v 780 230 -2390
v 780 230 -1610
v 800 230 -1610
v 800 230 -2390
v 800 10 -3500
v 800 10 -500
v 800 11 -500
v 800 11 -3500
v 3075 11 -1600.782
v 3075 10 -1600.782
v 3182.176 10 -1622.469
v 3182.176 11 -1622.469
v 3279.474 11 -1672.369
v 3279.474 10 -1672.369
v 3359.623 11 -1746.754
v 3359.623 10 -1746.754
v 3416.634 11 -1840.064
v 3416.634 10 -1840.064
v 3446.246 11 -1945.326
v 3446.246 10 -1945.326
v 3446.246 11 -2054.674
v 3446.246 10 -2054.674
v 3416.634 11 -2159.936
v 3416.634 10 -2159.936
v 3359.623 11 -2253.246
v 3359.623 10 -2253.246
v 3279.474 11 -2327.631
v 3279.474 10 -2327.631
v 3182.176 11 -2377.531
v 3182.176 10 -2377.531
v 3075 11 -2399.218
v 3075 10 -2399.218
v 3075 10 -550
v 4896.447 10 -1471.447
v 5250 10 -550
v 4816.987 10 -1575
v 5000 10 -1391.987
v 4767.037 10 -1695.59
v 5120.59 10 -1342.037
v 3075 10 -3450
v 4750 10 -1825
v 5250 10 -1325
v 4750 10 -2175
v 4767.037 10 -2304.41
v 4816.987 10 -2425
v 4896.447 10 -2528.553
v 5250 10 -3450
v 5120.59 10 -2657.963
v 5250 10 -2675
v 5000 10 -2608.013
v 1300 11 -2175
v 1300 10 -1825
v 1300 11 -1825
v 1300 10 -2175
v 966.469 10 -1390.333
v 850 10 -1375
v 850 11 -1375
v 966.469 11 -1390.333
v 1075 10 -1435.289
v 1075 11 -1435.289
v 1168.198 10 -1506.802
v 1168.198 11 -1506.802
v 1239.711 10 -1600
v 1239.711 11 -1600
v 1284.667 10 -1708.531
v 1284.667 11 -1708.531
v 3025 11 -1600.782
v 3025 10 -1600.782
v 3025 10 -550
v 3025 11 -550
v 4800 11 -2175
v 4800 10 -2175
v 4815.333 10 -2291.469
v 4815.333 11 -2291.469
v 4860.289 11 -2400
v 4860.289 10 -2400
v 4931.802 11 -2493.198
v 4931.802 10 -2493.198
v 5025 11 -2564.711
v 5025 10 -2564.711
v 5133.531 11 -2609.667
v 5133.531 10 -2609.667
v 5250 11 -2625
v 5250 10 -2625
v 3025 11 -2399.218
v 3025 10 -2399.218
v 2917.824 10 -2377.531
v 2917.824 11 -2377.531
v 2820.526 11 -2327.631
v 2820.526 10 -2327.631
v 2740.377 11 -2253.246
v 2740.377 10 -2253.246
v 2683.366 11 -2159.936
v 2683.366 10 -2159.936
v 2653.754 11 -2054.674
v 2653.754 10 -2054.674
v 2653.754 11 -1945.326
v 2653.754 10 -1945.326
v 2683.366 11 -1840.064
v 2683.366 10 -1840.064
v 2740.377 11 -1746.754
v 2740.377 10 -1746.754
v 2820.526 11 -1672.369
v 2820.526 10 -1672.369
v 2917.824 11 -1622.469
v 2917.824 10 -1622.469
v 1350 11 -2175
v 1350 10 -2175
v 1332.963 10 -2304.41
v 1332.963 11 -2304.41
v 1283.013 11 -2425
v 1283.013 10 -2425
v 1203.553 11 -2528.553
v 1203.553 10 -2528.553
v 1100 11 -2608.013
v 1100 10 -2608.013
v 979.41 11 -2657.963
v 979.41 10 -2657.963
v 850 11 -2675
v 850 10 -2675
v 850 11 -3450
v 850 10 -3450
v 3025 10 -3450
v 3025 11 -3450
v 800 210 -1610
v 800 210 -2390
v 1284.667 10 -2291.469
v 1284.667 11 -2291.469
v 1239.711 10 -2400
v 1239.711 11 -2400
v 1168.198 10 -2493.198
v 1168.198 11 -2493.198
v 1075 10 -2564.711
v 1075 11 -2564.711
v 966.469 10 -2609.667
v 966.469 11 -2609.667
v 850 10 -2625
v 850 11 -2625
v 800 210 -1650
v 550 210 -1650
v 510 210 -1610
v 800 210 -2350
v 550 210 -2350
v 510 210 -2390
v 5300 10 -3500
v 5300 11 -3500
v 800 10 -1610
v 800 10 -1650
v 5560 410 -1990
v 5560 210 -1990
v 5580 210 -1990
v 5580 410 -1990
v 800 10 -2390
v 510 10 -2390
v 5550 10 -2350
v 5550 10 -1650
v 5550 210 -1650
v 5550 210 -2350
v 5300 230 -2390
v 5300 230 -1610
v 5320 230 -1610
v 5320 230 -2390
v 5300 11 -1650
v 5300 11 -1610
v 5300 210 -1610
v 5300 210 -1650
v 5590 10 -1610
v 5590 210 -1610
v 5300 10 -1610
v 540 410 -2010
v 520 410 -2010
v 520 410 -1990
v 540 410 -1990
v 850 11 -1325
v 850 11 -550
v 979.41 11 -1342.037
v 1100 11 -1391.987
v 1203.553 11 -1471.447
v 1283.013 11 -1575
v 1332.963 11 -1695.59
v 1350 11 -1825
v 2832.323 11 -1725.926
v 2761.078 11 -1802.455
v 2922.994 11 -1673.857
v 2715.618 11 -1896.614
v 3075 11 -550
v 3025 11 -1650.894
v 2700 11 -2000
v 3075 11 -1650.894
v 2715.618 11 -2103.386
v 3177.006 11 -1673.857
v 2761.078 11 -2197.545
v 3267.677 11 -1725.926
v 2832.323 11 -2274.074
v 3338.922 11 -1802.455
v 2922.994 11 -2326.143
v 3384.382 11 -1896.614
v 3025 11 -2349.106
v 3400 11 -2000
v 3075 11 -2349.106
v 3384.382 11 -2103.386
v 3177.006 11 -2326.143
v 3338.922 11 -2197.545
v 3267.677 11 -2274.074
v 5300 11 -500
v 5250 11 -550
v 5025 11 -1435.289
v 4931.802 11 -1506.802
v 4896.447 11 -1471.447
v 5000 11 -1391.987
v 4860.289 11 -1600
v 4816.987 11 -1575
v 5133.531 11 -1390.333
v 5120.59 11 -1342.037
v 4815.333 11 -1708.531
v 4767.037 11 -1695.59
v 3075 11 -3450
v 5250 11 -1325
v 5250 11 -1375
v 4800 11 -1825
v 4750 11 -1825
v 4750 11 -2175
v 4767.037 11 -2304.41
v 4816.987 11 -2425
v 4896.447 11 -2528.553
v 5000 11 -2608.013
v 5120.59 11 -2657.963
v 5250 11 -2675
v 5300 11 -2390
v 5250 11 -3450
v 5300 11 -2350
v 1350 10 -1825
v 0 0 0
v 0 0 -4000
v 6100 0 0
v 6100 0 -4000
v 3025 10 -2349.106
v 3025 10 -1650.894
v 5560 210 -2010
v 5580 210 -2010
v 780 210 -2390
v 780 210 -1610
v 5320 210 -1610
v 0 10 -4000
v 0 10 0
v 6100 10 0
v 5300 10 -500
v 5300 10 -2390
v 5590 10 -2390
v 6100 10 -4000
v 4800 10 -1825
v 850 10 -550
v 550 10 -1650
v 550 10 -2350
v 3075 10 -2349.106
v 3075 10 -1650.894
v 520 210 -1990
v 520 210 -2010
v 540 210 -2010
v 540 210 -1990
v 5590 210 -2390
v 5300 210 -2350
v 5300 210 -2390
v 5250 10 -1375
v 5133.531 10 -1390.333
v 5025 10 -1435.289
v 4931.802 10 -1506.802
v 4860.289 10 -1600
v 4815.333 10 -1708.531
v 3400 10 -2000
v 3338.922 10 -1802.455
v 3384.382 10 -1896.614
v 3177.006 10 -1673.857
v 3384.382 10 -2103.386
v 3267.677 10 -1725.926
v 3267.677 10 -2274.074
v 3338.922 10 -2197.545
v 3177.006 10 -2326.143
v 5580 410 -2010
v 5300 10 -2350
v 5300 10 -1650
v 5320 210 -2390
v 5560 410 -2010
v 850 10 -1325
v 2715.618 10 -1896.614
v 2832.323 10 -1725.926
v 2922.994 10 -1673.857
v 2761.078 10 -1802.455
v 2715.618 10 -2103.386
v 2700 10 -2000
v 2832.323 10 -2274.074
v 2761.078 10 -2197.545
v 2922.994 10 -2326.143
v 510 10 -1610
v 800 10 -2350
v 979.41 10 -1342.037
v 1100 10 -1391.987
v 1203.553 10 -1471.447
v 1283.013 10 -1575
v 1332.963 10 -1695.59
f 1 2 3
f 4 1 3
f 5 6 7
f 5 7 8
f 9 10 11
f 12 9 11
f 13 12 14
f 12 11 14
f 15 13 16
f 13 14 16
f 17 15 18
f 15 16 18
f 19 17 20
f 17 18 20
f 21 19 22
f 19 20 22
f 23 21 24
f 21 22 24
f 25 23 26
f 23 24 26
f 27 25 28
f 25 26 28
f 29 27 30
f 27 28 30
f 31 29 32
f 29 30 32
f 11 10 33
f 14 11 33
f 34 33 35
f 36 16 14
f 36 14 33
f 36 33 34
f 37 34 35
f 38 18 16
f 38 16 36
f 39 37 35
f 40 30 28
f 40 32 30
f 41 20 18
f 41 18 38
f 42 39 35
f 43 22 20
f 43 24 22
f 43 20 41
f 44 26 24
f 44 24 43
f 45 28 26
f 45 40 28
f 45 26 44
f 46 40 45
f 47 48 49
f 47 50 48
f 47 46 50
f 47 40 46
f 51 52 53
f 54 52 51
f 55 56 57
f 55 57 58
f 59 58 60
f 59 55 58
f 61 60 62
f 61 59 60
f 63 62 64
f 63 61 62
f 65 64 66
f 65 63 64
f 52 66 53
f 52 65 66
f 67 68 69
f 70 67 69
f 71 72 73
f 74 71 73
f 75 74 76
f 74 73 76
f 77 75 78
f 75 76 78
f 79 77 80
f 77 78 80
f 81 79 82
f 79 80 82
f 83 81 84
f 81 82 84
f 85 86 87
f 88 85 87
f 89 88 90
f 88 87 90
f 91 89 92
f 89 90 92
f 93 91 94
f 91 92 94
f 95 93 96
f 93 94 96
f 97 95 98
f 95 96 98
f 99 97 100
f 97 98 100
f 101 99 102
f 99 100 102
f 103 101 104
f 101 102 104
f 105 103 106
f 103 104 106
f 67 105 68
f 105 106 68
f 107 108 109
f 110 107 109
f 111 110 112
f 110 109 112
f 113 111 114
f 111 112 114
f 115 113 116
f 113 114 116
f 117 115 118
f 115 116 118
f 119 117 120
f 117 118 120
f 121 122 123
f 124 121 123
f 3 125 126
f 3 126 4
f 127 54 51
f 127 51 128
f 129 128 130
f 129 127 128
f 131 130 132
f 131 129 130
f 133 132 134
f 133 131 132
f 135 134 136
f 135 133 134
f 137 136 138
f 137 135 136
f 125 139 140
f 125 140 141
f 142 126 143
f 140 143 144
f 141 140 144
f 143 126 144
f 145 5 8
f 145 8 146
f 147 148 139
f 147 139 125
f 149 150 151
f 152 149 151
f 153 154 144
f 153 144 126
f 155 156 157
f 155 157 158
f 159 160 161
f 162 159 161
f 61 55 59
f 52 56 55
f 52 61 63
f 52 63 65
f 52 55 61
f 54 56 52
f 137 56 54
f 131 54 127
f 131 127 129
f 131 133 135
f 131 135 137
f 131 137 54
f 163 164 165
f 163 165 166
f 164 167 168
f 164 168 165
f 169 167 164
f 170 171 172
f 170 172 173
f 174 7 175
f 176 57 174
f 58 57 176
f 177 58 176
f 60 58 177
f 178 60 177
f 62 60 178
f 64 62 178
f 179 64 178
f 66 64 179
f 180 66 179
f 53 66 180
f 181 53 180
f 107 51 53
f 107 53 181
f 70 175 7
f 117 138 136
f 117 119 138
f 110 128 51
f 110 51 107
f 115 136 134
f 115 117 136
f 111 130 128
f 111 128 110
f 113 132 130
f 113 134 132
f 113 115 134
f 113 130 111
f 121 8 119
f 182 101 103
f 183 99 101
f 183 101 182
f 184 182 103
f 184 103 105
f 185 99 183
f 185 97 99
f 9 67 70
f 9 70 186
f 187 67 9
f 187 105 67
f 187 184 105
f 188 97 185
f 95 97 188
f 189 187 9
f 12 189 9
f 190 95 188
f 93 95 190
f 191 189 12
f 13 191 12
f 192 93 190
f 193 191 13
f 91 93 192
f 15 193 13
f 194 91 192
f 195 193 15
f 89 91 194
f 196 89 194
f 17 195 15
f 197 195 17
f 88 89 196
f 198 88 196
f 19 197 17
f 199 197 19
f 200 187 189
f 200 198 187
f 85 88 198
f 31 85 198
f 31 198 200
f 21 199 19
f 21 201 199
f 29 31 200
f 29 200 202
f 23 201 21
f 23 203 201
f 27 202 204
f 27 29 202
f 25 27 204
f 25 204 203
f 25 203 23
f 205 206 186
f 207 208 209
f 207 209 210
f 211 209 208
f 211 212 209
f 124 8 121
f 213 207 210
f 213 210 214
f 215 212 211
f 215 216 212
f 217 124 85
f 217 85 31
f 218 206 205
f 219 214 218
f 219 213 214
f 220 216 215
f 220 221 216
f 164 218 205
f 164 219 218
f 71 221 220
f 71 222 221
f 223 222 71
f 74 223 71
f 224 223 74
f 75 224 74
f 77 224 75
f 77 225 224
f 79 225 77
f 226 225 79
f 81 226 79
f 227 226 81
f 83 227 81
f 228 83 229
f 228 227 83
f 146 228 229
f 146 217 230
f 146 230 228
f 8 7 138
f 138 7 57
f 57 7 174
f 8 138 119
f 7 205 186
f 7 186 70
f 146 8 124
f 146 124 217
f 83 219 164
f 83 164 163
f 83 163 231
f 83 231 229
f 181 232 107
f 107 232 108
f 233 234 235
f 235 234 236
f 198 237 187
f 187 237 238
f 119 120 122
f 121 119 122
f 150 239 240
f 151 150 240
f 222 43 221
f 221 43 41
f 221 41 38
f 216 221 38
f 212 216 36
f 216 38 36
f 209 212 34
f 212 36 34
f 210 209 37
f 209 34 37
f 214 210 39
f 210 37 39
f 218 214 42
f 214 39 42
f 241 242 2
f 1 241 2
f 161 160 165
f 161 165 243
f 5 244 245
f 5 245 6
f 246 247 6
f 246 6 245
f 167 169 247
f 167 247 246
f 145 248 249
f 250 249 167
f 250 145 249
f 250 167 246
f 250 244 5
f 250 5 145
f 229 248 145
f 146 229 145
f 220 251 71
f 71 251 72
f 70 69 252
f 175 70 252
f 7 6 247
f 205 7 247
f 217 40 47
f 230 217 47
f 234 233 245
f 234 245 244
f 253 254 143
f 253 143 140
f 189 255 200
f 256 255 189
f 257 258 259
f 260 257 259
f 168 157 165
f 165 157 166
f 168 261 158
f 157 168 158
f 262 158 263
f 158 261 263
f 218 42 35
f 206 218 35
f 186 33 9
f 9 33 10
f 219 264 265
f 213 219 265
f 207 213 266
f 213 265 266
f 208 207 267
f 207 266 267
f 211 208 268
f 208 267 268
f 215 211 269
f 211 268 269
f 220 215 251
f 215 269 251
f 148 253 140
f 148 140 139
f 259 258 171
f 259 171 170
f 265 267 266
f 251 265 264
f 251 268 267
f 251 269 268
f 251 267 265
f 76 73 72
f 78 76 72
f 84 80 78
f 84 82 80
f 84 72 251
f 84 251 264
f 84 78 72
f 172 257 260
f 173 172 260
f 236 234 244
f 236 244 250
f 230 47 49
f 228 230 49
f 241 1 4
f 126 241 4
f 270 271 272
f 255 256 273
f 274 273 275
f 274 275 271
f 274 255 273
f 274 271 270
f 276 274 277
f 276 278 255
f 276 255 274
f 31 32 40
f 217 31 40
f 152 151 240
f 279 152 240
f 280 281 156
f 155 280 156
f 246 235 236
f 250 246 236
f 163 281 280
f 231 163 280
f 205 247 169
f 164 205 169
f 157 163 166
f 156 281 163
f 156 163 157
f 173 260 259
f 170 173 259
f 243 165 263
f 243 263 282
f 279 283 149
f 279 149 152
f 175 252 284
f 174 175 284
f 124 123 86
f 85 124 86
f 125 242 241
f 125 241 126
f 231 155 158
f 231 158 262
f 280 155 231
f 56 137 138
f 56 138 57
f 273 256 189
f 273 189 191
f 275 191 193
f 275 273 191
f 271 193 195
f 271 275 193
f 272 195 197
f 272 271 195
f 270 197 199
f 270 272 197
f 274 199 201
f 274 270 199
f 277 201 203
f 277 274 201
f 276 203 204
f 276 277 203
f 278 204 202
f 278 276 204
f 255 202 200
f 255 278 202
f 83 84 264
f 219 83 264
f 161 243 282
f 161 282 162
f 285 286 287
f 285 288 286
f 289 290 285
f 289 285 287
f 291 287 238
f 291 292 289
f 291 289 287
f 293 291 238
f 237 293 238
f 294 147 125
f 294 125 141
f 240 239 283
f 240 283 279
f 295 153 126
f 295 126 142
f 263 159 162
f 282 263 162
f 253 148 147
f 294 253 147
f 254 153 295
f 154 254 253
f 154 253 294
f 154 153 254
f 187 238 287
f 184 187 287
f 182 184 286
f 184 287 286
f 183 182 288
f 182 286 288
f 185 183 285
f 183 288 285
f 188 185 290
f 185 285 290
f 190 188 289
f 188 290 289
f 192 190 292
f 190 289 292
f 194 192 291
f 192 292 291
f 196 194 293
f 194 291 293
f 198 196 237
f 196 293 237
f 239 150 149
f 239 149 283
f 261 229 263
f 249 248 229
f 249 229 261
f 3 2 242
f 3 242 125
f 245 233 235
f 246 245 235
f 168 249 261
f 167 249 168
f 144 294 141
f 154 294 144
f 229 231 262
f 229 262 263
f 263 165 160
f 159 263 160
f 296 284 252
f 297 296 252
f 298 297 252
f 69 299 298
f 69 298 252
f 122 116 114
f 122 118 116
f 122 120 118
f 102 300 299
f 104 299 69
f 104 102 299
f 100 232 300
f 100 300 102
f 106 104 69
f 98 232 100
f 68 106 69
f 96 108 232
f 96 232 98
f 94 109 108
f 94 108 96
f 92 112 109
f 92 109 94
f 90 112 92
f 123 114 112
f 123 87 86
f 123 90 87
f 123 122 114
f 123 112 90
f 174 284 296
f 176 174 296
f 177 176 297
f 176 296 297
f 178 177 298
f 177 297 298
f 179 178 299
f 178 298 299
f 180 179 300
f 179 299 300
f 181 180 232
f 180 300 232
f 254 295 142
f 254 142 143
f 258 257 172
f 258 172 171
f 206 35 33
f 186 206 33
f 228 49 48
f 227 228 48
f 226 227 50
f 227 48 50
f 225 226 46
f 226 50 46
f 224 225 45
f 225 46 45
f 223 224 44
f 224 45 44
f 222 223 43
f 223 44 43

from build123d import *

# Parameters (mm, degrees)
SKETCH1_W              = 6100
SKETCH1_H              = 4000
BOSS_EXTRUDE1_DEPTH    = 10
SKETCH4_W              = 4500
SKETCH4_H              = 3000
BOSS_EXTRUDE3_DEPTH    = 1
BOSS_EXTRUDE4_DEPTH    = 200
BOSS_EXTRUDE8_DEPTH    = 200
SKETCH10_W             = 20
SKETCH10_H             = 20
BOSS_EXTRUDE9_DEPTH    = 200
BOSS_EXTRUDE9_2_DEPTH  = 200
SKETCH11_W             = 20
SKETCH11_H             = 20
BOSS_EXTRUDE10_DEPTH   = 780
BOSS_EXTRUDE10_2_DEPTH = 780


with BuildPart() as part:
    # Sketch1 → Boss-Extrude1 (new body)
    with BuildSketch(Plane(origin=(0, 0, 0), x_dir=(1, 0, 0), z_dir=(0, 1, 0))):
        with Locations((3050, 2000)):
            Rectangle(SKETCH1_W, SKETCH1_H)
    extrude(amount=BOSS_EXTRUDE1_DEPTH)

    # Sketch4 → Boss-Extrude3 (add)
    with BuildSketch(Plane(origin=(0, 10, 0), x_dir=(1, 0, 0), z_dir=(0, 1, 0))):
        with Locations((3050, 2000)):
            Rectangle(SKETCH4_W, SKETCH4_H)
        with BuildLine():
            Line((850, 2675), (850, 3450))
            Line((850, 3450), (3025, 3450))
            Line((3025, 3450), (3025, 2399.217985567))
            ThreePointArc((3025, 2399.217985567), (2650, 2000), (3025, 1600.782014433))
            Line((3025, 1600.782014433), (3025, 550))
            Line((3025, 550), (850, 550))
            Line((850, 550), (850, 1325))
            ThreePointArc((850, 1325), (1203.553390593, 1471.446609407), (1350, 1825))
            Line((1350, 1825), (1350, 2175))
            ThreePointArc((1350, 2175), (1203.553390593, 2528.553390593), (850, 2675))
        make_face(mode=Mode.SUBTRACT)
        with BuildLine():
            Line((3075, 2399.217985567), (3075, 3450))
            Line((3075, 3450), (5250, 3450))
            Line((5250, 3450), (5250, 2675))
            ThreePointArc((5250, 2675), (4896.446609407, 2528.553390593), (4750, 2175))
            Line((4750, 2175), (4750, 1825))
            ThreePointArc((4750, 1825), (4896.446609407, 1471.446609407), (5250, 1325))
            Line((5250, 1325), (5250, 550))
            Line((5250, 550), (3075, 550))
            Line((3075, 550), (3075, 1600.782014433))
            ThreePointArc((3075, 1600.782014433), (3450, 2000), (3075, 2399.217985567))
        make_face(mode=Mode.SUBTRACT)
        with BuildLine():
            Line((3025, 2349.106001094), (3025, 1650.893998906))
            ThreePointArc((3025, 1650.893998906), (2700, 2000), (3025, 2349.106001094))
        make_face(mode=Mode.SUBTRACT)
        with BuildLine():
            Line((3075, 2349.106001094), (3075, 1650.893998906))
            ThreePointArc((3075, 1650.893998906), (3400, 2000), (3075, 2349.106001094))
        make_face(mode=Mode.SUBTRACT)
        with BuildLine():
            Line((5250, 2625), (5250, 1375))
            ThreePointArc((5250, 1375), (4931.801948466, 1506.801948466), (4800, 1825))
            Line((4800, 1825), (4800, 2175))
            ThreePointArc((4800, 2175), (4931.801948466, 2493.198051534), (5250, 2625))
        make_face(mode=Mode.SUBTRACT)
        with BuildLine():
            Line((850, 2625), (850, 1375))
            ThreePointArc((850, 1375), (1168.198051534, 1506.801948466), (1300, 1825))
            Line((1300, 1825), (1300, 2175))
            ThreePointArc((1300, 2175), (1168.198051534, 2493.198051534), (850, 2625))
        make_face(mode=Mode.SUBTRACT)
    extrude(amount=BOSS_EXTRUDE3_DEPTH)

    # Sketch5 → Boss-Extrude4 (add)
    with BuildSketch(Plane(origin=(0, 10, 0), x_dir=(1, 0, 0), z_dir=(0, 1, 0))):
        Polygon((5300, 2390), (5590, 2390), (5590, 1610), (5300, 1610), (5300, 1650), (5550, 1650), (5550, 2350), (5300, 2350), align=None)
    extrude(amount=BOSS_EXTRUDE4_DEPTH)


with BuildPart() as body_2:
    # Sketch9 → Boss-Extrude8 (new body)
    with BuildSketch(Plane(origin=(0, 10, 0), x_dir=(1, 0, 0), z_dir=(0, 1, 0))):
        Polygon((800, 2390), (800, 2350), (550, 2350), (550, 1650), (800, 1650), (800, 1610), (510, 1610), (510, 2390), align=None)
    extrude(amount=BOSS_EXTRUDE8_DEPTH)


with BuildPart() as body_3:
    # Sketch10 → Boss-Extrude9 (new body)
    with BuildSketch(Plane(origin=(0, 210, 0), x_dir=(1, 0, 0), z_dir=(0, 1, 0))):
        with Locations((530, 2000)):
            Rectangle(SKETCH10_W, SKETCH10_H)
    extrude(amount=BOSS_EXTRUDE9_DEPTH)


with BuildPart() as body_4:
    # Sketch10 → Boss-Extrude9 2 (new body)
    with BuildSketch(Plane(origin=(0, 210, 0), x_dir=(1, 0, 0), z_dir=(0, 1, 0))):
        with Locations((5570, 2000)):
            Rectangle(SKETCH10_W, SKETCH10_H)
    extrude(amount=BOSS_EXTRUDE9_2_DEPTH)


with BuildPart() as body_5:
    # Sketch11 → Boss-Extrude10 (new body)
    with BuildSketch(Plane.XY.offset(-1610)):
        with Locations((790, 220)):
            Rectangle(SKETCH11_W, SKETCH11_H)
    extrude(amount=-BOSS_EXTRUDE10_DEPTH)


with BuildPart() as body_6:
    # Sketch11 → Boss-Extrude10 2 (new body)
    with BuildSketch(Plane.XY.offset(-1610)):
        with Locations((5310, 220)):
            Rectangle(SKETCH11_W, SKETCH11_H)
    extrude(amount=-BOSS_EXTRUDE10_2_DEPTH)


solid = Compound([part.part, body_2.part, body_3.part, body_4.part, body_5.part, body_6.part])
